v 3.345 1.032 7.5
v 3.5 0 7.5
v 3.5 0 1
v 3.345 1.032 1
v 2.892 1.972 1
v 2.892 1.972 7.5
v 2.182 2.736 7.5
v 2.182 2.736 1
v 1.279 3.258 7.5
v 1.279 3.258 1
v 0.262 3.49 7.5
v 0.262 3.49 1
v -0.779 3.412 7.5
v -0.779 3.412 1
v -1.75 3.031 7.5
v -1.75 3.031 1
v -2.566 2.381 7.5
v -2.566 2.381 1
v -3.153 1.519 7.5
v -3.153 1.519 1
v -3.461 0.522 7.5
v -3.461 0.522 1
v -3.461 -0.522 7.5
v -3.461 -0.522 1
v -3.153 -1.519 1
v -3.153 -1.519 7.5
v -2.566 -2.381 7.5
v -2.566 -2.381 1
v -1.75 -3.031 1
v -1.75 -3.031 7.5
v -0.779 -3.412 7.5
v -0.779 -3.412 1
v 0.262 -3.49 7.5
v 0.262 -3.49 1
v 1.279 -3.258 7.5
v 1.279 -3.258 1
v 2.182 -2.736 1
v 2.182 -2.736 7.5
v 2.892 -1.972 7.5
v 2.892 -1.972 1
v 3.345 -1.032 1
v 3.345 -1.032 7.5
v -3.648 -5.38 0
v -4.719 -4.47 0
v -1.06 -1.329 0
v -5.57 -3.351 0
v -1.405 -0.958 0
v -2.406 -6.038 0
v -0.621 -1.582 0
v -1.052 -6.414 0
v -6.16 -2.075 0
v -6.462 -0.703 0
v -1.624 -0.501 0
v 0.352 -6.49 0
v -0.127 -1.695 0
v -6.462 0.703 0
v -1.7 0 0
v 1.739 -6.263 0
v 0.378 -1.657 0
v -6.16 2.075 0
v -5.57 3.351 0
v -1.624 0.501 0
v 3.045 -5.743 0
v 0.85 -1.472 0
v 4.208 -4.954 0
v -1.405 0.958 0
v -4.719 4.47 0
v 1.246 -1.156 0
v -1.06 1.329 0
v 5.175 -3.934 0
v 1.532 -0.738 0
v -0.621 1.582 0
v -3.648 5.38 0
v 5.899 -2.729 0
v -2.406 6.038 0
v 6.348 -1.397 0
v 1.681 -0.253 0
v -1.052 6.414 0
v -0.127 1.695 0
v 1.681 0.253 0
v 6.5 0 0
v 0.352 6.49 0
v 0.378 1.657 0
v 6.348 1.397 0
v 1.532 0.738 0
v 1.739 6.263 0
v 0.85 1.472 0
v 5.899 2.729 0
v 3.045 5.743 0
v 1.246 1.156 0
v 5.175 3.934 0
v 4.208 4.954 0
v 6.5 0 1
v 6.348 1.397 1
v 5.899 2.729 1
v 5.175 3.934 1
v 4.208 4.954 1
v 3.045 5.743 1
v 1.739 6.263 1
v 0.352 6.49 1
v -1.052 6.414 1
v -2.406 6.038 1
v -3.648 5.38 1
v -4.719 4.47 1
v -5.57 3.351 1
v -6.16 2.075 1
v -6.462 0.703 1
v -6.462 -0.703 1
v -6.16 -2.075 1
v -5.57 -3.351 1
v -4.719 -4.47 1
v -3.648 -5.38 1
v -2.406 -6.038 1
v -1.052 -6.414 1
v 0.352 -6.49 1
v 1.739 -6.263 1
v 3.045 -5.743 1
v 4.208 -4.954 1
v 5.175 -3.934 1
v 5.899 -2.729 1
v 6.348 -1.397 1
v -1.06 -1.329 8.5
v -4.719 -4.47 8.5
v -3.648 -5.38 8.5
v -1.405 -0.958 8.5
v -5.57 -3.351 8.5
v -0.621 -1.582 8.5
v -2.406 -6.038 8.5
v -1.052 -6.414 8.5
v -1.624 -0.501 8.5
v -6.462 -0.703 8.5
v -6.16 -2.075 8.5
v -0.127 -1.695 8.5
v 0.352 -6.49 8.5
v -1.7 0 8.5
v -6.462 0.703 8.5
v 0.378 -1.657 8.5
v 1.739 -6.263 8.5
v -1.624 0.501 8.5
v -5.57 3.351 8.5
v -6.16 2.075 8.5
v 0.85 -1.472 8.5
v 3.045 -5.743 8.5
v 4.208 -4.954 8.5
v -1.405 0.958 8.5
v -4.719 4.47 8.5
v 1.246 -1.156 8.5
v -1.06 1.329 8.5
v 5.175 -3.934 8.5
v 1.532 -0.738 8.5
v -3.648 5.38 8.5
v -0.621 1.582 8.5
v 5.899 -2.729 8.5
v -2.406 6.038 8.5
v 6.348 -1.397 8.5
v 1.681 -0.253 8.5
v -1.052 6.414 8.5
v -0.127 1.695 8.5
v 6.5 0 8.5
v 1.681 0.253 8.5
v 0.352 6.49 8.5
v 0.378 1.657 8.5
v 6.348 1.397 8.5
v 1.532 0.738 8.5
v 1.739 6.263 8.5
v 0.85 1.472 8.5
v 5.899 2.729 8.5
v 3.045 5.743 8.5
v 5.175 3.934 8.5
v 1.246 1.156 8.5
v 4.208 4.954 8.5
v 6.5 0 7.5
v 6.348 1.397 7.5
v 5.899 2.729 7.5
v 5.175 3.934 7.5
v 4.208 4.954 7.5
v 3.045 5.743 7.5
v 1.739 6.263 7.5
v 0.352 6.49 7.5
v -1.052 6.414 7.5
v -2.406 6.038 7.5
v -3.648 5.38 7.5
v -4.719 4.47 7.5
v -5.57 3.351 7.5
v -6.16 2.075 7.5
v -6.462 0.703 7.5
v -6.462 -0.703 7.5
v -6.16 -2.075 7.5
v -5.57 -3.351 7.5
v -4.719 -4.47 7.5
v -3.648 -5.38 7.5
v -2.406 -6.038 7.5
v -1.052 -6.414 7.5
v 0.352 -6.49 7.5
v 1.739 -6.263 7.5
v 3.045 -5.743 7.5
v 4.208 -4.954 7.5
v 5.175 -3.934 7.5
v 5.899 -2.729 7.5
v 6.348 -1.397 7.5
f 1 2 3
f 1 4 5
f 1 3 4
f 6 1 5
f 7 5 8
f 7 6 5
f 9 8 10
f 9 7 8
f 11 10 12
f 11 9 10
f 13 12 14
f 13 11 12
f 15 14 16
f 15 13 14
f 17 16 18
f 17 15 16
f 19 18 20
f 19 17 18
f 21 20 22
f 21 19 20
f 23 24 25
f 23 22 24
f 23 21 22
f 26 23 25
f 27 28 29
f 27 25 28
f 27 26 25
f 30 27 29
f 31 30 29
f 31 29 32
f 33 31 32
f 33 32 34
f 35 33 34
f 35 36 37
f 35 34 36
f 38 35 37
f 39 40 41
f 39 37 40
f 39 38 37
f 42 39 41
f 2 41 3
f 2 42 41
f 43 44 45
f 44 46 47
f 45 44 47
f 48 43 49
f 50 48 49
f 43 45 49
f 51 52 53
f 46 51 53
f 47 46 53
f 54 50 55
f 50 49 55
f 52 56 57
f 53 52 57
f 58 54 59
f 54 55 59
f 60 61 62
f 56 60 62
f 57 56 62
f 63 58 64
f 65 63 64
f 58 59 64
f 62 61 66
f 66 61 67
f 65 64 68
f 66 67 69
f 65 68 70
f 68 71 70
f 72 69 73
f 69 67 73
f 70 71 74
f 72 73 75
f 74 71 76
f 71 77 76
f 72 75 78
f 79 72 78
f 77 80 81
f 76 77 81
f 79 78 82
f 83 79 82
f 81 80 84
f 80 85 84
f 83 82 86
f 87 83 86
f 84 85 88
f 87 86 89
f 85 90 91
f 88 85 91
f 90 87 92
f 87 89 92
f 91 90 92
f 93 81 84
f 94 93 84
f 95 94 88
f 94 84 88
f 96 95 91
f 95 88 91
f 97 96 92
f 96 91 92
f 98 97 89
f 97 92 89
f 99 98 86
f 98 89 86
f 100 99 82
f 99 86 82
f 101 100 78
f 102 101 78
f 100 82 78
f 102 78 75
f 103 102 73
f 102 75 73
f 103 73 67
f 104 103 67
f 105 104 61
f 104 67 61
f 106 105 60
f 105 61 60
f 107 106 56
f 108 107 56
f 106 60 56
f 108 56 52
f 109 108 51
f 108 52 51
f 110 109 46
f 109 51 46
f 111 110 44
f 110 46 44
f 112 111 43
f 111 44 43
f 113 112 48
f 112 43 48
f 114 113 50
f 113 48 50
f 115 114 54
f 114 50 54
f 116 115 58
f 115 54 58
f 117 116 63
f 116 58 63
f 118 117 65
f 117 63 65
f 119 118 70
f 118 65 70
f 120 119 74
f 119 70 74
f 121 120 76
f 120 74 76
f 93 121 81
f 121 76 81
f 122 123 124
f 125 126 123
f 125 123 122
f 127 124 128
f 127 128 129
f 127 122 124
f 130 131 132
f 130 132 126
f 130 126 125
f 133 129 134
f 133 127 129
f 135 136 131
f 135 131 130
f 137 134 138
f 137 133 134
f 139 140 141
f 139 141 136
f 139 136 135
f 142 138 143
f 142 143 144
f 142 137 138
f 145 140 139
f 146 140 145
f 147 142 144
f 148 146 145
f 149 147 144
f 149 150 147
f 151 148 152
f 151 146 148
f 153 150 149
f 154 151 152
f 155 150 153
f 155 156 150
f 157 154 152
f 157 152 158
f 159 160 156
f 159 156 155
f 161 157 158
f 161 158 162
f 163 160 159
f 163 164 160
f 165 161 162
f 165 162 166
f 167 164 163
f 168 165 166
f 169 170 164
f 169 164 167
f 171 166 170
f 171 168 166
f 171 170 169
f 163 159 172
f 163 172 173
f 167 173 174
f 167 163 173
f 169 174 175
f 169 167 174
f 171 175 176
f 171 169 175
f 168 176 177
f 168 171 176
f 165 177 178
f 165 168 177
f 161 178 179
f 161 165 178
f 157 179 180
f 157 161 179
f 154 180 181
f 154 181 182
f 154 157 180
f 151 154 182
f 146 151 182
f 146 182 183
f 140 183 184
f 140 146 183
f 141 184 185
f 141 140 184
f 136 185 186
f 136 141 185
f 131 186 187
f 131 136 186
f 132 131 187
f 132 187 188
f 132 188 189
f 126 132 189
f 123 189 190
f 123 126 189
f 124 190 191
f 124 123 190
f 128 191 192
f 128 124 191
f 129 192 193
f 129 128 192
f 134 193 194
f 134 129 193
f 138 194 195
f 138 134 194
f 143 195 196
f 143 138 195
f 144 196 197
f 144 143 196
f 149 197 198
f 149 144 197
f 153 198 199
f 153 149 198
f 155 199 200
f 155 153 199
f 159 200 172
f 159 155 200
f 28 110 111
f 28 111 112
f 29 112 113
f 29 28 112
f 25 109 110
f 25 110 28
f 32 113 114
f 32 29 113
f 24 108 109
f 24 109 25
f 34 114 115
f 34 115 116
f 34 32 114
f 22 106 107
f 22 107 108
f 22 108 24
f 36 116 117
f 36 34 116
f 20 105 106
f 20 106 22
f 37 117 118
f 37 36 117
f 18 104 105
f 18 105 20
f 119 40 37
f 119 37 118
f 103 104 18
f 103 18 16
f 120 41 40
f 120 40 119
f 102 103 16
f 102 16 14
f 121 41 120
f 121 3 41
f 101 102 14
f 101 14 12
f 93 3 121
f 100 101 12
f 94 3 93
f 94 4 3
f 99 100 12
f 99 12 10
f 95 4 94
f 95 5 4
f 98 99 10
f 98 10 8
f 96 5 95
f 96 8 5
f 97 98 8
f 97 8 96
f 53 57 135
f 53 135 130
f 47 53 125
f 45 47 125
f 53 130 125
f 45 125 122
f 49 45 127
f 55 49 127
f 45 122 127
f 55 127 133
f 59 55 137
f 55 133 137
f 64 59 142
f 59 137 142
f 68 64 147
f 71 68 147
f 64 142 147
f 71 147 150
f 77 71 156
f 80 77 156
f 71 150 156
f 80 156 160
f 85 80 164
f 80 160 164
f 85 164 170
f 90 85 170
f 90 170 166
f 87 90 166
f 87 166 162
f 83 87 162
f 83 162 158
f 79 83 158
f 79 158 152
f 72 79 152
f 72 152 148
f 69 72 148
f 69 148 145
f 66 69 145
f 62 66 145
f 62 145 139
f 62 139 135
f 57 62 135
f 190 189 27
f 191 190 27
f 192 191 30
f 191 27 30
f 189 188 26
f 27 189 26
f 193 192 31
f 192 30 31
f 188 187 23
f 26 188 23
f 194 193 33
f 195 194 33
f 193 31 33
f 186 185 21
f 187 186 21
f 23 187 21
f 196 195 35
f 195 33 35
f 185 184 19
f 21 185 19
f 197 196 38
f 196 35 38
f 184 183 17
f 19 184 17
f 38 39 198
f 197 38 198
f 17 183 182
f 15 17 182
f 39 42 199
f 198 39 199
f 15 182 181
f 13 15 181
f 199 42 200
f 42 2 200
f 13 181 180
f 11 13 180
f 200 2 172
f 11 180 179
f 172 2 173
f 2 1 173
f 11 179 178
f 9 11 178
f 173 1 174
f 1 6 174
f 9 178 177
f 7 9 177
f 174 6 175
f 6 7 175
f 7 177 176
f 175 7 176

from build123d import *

# Parameters (mm, degrees)
F0_R     = 6.5
F0_R_2   = 3.5
F1_DEPTH = 1
F2_DEPTH = 4.25
F4_D     = 3.4


with BuildPart() as f1:
    # F0 (on Top) → F1 (new body)
    with BuildSketch(Plane.XY):
        Circle(F0_R)
        Circle(F0_R_2, mode=Mode.SUBTRACT)
        Circle(F0_R_2)
    extrude(amount=F1_DEPTH)

    # F0 (on Top) → F2 (join)
    with BuildSketch(Plane.XY):
        Circle(F0_R_2)
    extrude(amount=F2_DEPTH)

    # F3: F1 across face


with BuildPart() as f1_1:
    add(f1.part)
    add(f1.part.mirror(Plane.XY.offset(4.25)))

    # F4 (through all)
    with Locations(Plane(origin=(0, 0, 0), x_dir=(1, 0, 0), z_dir=(0, 0, -1))):
        with Locations((0, 0)):
            Hole(F4_D / 2)


solid = f1_1.part
